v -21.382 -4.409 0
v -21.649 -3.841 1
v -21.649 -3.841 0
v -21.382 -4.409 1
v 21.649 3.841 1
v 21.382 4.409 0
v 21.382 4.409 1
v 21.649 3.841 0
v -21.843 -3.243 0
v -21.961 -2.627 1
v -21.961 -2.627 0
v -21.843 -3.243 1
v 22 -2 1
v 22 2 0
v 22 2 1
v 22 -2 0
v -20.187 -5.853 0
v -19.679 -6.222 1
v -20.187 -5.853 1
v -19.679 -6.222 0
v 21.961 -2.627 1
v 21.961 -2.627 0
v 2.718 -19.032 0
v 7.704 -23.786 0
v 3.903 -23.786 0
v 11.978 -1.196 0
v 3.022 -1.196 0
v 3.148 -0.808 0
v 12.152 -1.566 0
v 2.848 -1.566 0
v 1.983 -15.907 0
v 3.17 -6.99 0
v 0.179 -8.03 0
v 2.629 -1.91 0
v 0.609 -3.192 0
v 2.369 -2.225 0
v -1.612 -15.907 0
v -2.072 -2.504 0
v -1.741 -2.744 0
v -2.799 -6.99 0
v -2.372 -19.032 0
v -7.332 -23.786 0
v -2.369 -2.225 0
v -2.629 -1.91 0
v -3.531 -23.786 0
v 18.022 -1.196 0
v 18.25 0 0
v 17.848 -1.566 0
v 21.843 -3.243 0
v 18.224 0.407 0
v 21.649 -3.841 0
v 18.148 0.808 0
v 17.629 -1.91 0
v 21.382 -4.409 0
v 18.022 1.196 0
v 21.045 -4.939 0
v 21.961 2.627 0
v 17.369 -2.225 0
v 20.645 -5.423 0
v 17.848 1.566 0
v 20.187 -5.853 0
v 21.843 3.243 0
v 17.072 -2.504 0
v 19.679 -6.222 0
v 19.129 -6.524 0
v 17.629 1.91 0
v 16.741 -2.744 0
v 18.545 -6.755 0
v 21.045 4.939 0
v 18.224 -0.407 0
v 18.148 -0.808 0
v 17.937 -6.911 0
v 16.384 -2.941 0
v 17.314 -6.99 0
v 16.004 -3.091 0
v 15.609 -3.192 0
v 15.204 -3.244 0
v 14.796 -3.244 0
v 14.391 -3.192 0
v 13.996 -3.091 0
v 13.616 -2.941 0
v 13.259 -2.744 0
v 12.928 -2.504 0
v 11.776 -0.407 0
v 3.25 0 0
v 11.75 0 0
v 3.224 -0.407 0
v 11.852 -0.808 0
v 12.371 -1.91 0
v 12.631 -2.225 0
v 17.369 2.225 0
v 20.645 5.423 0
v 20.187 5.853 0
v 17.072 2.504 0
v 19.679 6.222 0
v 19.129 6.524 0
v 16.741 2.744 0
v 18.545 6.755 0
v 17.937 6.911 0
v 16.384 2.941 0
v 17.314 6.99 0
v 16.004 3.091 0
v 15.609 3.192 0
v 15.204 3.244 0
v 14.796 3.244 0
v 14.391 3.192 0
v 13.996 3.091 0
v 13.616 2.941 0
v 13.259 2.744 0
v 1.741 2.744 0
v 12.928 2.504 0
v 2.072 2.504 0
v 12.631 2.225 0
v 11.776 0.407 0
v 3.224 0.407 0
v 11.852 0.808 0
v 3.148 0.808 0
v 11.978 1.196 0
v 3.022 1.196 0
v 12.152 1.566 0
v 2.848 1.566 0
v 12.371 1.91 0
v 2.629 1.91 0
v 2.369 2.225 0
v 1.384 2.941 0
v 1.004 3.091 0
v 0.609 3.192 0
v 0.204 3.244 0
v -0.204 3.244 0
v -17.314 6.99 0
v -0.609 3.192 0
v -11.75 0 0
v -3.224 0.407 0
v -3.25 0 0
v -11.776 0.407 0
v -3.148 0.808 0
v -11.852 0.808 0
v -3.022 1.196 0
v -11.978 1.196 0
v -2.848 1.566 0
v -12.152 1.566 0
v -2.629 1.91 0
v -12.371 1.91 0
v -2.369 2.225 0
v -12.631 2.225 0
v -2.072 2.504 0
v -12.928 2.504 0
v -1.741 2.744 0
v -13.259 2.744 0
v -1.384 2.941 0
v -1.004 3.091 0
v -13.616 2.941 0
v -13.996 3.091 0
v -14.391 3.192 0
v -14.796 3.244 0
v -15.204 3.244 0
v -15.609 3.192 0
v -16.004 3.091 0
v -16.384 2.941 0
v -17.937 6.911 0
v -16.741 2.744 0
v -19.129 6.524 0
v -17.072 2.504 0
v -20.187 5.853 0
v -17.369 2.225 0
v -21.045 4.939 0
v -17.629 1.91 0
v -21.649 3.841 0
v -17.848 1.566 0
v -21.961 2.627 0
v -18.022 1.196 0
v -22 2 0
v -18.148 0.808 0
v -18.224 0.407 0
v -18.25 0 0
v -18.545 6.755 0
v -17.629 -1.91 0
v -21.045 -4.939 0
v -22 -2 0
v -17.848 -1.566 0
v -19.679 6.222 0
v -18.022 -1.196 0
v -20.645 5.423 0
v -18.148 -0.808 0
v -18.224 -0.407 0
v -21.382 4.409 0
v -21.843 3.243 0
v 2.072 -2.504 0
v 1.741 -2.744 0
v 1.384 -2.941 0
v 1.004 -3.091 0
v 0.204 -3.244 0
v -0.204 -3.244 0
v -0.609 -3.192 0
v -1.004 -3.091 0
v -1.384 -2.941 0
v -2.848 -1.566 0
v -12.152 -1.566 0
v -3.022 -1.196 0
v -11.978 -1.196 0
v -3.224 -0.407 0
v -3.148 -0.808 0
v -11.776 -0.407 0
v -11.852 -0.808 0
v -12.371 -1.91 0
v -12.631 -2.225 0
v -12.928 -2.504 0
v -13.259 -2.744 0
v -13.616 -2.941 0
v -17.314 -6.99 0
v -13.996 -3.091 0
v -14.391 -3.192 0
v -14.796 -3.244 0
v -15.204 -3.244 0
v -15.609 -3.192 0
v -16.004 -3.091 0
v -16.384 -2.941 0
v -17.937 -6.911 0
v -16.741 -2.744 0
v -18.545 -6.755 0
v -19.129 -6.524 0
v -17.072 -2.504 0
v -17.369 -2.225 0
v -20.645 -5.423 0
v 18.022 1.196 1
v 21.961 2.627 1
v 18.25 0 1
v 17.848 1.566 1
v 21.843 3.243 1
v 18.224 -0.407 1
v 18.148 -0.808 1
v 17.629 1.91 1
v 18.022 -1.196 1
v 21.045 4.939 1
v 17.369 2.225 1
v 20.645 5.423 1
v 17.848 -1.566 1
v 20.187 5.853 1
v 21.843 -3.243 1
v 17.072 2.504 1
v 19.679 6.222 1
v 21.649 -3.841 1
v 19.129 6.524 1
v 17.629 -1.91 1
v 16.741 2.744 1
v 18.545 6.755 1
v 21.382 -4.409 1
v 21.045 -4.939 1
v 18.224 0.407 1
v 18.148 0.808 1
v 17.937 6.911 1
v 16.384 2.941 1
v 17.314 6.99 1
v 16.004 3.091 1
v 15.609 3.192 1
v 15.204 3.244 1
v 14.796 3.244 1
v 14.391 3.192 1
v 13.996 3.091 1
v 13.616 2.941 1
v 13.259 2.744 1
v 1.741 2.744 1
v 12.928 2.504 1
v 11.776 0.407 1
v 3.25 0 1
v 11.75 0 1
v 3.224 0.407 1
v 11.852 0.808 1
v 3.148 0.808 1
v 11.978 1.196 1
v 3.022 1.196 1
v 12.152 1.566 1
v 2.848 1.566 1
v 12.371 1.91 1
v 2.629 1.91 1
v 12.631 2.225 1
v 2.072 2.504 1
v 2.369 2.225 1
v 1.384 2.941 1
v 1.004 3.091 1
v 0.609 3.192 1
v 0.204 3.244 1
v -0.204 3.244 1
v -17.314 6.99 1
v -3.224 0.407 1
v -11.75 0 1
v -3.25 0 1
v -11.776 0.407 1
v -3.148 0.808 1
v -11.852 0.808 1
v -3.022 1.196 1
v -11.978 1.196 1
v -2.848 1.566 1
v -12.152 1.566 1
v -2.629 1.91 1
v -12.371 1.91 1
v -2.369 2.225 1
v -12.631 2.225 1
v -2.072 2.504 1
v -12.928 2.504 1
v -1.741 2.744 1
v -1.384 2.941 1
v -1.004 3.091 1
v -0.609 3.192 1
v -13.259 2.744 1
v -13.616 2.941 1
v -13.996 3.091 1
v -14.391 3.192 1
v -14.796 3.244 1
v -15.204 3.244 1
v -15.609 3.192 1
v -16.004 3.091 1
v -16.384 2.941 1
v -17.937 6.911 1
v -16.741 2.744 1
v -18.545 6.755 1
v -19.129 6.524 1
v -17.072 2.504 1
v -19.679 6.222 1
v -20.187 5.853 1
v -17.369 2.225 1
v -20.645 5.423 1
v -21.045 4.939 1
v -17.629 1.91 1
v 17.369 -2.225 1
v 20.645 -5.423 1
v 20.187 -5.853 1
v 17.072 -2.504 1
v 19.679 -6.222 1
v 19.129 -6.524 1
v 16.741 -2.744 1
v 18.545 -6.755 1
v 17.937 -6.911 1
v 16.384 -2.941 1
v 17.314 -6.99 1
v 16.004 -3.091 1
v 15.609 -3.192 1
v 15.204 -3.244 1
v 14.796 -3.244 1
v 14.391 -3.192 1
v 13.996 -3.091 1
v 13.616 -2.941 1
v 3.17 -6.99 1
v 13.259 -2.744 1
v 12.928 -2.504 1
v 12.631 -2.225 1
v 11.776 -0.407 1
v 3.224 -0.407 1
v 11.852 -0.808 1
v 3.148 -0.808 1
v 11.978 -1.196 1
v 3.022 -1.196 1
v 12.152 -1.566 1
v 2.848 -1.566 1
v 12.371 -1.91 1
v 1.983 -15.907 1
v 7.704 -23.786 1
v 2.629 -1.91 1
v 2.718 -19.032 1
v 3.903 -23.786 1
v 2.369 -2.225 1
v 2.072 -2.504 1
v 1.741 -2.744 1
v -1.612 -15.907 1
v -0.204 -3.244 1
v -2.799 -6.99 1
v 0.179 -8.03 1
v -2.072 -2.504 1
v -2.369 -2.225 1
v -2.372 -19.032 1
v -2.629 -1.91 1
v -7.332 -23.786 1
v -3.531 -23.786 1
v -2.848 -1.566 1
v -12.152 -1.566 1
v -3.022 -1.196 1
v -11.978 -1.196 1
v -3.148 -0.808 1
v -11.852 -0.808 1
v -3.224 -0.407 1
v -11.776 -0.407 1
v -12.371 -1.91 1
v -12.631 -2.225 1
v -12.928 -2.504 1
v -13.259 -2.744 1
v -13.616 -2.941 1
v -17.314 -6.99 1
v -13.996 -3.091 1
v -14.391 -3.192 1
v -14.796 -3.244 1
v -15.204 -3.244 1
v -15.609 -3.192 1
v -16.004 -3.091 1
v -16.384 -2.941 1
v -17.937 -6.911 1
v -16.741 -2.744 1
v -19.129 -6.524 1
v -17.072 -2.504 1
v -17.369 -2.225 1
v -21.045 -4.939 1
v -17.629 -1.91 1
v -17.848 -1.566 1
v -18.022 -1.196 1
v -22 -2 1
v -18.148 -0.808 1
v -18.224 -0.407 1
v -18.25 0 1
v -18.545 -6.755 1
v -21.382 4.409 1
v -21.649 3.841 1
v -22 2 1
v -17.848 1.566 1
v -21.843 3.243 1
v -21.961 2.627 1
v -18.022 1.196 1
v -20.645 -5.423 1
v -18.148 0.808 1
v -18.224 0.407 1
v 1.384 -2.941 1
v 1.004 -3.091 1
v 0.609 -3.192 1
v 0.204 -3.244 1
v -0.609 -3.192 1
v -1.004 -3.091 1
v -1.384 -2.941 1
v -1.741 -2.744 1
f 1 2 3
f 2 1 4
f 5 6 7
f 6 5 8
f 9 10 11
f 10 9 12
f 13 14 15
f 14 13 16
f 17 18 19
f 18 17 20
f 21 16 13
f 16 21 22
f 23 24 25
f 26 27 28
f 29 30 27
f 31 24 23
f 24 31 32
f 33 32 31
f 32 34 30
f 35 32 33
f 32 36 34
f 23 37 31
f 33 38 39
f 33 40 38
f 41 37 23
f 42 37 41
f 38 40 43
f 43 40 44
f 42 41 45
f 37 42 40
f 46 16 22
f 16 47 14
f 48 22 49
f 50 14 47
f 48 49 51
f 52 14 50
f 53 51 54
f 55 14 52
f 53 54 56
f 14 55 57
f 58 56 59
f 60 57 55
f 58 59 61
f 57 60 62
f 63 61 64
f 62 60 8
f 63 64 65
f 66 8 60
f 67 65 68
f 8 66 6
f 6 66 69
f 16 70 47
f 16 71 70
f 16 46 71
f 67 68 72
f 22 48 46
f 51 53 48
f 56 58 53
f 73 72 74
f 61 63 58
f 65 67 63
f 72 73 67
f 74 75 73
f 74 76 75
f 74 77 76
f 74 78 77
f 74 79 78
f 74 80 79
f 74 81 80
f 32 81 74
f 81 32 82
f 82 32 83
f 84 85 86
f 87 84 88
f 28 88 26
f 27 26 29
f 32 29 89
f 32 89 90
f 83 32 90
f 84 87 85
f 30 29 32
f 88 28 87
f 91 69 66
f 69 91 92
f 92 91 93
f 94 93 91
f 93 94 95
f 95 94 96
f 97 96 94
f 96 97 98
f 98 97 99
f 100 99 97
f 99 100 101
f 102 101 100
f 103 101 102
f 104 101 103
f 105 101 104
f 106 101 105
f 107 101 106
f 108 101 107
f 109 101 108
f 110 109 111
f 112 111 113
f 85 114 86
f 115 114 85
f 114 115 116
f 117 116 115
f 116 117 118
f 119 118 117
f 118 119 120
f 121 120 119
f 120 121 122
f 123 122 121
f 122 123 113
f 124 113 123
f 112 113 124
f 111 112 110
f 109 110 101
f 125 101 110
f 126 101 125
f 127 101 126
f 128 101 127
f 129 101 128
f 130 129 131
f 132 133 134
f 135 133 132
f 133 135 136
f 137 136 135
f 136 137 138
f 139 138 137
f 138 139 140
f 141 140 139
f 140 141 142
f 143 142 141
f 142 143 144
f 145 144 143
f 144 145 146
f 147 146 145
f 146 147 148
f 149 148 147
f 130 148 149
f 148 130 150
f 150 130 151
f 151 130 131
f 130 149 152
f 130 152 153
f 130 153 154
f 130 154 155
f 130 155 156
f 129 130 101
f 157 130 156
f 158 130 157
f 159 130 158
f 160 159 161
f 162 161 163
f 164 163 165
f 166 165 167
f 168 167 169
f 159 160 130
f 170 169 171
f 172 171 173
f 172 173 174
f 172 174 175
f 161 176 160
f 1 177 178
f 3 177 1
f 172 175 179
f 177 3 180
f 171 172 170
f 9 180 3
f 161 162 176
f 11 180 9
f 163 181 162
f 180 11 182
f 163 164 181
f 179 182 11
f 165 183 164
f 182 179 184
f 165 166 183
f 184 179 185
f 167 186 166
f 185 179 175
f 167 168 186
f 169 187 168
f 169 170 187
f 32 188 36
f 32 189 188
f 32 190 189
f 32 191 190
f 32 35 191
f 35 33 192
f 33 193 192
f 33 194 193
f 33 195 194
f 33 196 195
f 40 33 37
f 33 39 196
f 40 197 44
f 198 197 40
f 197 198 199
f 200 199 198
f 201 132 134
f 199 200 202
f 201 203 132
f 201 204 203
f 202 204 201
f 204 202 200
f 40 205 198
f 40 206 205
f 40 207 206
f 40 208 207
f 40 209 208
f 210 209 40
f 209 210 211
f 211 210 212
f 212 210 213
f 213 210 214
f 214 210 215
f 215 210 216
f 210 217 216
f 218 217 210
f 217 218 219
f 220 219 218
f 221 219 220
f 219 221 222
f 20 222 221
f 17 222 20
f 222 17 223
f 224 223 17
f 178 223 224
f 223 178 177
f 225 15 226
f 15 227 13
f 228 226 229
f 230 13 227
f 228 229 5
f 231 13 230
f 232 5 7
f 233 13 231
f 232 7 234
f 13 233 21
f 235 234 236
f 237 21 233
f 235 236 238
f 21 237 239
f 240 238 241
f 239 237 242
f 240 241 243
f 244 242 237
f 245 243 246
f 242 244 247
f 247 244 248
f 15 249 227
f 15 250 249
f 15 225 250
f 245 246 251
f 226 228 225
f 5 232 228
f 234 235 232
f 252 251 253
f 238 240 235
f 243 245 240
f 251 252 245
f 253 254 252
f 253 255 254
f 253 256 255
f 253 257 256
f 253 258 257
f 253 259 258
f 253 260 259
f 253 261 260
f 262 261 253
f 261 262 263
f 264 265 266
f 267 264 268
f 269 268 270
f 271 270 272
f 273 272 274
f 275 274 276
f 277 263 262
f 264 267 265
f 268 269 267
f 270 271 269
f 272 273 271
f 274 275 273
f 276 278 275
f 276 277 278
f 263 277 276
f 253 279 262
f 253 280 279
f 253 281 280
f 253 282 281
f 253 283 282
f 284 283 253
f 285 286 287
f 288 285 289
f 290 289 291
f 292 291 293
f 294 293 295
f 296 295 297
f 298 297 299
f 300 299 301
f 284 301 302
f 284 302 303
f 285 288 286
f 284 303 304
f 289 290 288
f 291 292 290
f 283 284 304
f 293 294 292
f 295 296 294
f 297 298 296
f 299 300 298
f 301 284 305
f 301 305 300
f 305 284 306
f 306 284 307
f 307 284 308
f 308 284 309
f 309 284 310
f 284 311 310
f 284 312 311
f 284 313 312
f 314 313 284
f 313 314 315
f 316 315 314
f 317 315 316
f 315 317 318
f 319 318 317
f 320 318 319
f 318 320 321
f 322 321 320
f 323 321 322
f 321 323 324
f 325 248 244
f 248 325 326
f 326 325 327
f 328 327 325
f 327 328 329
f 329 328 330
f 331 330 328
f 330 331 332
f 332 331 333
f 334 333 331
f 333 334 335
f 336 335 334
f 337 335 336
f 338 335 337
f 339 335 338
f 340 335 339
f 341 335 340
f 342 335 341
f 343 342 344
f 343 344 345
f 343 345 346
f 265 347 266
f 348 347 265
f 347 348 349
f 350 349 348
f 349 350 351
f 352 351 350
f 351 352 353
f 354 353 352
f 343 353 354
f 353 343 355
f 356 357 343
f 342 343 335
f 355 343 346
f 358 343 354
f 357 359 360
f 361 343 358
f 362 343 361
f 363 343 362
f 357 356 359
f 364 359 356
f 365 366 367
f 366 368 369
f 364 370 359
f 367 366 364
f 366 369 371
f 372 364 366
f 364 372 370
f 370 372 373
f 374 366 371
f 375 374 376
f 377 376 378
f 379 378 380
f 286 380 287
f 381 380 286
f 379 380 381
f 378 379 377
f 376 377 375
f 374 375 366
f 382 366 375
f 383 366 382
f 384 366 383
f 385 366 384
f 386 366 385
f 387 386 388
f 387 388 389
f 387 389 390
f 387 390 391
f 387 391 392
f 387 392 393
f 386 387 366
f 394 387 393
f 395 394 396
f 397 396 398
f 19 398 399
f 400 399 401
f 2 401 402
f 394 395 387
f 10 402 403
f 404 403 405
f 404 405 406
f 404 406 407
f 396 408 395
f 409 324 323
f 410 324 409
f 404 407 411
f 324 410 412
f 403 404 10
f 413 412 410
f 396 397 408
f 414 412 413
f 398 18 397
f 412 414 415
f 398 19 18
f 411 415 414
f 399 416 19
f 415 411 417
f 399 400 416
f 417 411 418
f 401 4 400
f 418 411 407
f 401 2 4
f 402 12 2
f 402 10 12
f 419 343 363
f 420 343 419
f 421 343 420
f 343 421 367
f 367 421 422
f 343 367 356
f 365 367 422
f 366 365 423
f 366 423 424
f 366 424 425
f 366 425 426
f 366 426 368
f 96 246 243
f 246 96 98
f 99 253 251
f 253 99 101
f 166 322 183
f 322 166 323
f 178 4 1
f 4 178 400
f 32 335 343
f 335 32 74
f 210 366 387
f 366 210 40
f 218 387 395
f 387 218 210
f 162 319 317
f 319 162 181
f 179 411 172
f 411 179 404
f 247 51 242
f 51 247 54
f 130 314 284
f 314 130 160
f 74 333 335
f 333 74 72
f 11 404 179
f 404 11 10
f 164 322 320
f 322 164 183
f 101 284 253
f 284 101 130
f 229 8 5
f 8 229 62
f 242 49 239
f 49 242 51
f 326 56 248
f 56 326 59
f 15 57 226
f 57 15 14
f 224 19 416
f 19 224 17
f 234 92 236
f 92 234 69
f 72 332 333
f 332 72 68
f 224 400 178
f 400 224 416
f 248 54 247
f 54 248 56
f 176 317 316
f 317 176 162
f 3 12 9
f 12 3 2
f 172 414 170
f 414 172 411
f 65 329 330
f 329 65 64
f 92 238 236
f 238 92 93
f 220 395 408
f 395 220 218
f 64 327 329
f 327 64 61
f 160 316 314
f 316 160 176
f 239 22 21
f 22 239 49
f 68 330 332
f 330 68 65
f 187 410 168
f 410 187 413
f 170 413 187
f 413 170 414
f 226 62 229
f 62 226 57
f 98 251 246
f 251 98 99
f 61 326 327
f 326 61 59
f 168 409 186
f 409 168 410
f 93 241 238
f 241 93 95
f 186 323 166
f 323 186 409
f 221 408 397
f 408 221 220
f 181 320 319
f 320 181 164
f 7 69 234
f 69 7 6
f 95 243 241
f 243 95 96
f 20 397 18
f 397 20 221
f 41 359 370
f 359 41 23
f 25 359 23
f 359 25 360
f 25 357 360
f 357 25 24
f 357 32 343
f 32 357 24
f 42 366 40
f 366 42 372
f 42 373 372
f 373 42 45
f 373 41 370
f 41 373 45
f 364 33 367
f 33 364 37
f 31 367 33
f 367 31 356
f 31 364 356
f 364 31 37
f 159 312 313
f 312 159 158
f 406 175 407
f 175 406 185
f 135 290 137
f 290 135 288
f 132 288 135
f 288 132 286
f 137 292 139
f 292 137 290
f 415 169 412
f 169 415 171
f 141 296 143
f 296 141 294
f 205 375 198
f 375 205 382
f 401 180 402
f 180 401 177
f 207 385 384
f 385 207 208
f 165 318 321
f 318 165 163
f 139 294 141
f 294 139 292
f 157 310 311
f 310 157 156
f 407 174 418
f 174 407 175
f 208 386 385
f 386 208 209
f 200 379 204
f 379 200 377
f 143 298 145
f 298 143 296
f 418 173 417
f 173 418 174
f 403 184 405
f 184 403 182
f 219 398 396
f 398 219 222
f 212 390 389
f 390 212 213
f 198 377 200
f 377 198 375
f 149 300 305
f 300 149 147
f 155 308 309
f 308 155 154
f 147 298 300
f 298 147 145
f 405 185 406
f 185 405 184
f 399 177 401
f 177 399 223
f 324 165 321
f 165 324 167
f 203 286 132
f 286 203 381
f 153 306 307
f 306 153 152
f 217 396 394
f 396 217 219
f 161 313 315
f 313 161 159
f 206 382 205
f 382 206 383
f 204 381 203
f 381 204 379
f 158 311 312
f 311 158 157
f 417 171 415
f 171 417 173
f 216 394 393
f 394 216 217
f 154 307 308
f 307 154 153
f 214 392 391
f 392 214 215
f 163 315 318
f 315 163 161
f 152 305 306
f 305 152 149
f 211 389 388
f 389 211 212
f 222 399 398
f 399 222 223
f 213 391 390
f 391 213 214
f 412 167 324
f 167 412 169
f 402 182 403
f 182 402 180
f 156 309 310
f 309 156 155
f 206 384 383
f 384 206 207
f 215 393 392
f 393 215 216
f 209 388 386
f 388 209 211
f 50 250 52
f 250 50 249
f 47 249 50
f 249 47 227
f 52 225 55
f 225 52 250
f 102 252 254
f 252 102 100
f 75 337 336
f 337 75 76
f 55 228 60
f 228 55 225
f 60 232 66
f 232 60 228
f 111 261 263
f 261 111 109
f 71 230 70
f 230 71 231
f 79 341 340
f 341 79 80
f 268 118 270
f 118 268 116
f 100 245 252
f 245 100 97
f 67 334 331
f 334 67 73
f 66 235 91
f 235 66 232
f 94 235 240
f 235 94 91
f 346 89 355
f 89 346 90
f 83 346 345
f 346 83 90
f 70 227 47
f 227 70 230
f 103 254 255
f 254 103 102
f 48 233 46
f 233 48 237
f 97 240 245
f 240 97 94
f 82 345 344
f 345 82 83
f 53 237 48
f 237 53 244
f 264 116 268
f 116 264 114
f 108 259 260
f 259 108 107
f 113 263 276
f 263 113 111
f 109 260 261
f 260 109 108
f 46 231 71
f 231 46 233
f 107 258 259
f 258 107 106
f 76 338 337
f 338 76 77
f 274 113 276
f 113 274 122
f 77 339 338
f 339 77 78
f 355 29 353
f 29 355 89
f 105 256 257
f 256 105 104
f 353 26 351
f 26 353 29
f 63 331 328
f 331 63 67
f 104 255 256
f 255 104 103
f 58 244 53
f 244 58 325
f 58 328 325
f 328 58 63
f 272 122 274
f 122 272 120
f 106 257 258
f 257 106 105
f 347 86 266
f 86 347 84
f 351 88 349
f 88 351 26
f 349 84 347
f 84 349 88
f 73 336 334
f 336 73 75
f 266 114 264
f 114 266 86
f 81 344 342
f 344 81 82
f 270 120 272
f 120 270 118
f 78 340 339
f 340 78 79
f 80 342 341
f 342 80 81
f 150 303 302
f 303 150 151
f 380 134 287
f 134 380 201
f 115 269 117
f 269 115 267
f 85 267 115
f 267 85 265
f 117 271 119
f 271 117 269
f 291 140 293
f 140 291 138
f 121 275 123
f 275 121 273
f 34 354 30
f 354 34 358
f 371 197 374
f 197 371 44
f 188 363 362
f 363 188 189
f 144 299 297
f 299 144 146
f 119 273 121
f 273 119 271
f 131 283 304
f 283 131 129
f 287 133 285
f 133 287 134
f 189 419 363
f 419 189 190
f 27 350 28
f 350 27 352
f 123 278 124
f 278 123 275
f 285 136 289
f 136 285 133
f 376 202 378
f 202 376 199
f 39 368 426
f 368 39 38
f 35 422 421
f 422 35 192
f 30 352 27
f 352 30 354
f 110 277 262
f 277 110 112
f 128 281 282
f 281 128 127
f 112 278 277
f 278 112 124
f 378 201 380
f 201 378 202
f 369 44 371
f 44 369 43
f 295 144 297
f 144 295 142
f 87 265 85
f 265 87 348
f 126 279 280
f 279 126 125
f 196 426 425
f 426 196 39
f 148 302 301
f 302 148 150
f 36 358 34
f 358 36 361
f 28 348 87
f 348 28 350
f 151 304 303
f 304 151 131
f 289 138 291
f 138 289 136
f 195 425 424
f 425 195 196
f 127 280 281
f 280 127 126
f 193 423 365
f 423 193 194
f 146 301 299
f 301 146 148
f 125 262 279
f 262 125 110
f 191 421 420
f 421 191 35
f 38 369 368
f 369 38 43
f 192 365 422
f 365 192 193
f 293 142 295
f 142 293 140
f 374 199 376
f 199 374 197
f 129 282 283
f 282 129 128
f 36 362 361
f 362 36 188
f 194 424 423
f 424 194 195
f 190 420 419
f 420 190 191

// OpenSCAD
$fn = 50;


difference() {
	union() {
		translate(v = [0, 0, 0]) {
			rotate(a = [0, 0, 0]) {
				hull() {
					translate(v = [-17.0000000000, 2.0000000000, 0]) {
						rotate(a = [0, 0, 0]) {
							translate(v = [0, 0, 0]) {
								rotate(a = [0, 0, 0]) {
									cylinder(h = 1, r = 5);
								}
							}
						}
					}
					translate(v = [17.0000000000, 2.0000000000, 0]) {
						rotate(a = [0, 0, 0]) {
							translate(v = [0, 0, 0]) {
								rotate(a = [0, 0, 0]) {
									cylinder(h = 1, r = 5);
								}
							}
						}
					}
					translate(v = [-17.0000000000, -2.0000000000, 0]) {
						rotate(a = [0, 0, 0]) {
							translate(v = [0, 0, 0]) {
								rotate(a = [0, 0, 0]) {
									cylinder(h = 1, r = 5);
								}
							}
						}
					}
					translate(v = [17.0000000000, -2.0000000000, 0]) {
						rotate(a = [0, 0, 0]) {
							translate(v = [0, 0, 0]) {
								rotate(a = [0, 0, 0]) {
									cylinder(h = 1, r = 5);
								}
							}
						}
					}
				}
			}
		}
		translate(v = [0, -5, 0]) {
			rotate(a = [0, 0, 0]) {
				linear_extrude(height = 1) {
					text(font = "DejaVu Sans Mono:style=Bold", halign = "center", size = 19.0000000000, text = "A", valign = "top");
				}
			}
		}
	}
	union() {
		translate(v = [-15.0000000000, 0.0000000000, -125.0000000000]) {
			rotate(a = [0, 0, 0]) {
				cylinder(h = 250, r = 3.2500000000);
			}
		}
		translate(v = [15.0000000000, 0.0000000000, -125.0000000000]) {
			rotate(a = [0, 0, 0]) {
				cylinder(h = 250, r = 3.2500000000);
			}
		}
		translate(v = [15.0000000000, 0.0000000000, -125.0000000000]) {
			rotate(a = [0, 0, 0]) {
				cylinder(h = 250, r = 3.2500000000);
			}
		}
		translate(v = [0, 0, -125.0000000000]) {
			rotate(a = [0, 0, 0]) {
				cylinder(h = 250, r = 3.2500000000);
			}
		}
	}
}
